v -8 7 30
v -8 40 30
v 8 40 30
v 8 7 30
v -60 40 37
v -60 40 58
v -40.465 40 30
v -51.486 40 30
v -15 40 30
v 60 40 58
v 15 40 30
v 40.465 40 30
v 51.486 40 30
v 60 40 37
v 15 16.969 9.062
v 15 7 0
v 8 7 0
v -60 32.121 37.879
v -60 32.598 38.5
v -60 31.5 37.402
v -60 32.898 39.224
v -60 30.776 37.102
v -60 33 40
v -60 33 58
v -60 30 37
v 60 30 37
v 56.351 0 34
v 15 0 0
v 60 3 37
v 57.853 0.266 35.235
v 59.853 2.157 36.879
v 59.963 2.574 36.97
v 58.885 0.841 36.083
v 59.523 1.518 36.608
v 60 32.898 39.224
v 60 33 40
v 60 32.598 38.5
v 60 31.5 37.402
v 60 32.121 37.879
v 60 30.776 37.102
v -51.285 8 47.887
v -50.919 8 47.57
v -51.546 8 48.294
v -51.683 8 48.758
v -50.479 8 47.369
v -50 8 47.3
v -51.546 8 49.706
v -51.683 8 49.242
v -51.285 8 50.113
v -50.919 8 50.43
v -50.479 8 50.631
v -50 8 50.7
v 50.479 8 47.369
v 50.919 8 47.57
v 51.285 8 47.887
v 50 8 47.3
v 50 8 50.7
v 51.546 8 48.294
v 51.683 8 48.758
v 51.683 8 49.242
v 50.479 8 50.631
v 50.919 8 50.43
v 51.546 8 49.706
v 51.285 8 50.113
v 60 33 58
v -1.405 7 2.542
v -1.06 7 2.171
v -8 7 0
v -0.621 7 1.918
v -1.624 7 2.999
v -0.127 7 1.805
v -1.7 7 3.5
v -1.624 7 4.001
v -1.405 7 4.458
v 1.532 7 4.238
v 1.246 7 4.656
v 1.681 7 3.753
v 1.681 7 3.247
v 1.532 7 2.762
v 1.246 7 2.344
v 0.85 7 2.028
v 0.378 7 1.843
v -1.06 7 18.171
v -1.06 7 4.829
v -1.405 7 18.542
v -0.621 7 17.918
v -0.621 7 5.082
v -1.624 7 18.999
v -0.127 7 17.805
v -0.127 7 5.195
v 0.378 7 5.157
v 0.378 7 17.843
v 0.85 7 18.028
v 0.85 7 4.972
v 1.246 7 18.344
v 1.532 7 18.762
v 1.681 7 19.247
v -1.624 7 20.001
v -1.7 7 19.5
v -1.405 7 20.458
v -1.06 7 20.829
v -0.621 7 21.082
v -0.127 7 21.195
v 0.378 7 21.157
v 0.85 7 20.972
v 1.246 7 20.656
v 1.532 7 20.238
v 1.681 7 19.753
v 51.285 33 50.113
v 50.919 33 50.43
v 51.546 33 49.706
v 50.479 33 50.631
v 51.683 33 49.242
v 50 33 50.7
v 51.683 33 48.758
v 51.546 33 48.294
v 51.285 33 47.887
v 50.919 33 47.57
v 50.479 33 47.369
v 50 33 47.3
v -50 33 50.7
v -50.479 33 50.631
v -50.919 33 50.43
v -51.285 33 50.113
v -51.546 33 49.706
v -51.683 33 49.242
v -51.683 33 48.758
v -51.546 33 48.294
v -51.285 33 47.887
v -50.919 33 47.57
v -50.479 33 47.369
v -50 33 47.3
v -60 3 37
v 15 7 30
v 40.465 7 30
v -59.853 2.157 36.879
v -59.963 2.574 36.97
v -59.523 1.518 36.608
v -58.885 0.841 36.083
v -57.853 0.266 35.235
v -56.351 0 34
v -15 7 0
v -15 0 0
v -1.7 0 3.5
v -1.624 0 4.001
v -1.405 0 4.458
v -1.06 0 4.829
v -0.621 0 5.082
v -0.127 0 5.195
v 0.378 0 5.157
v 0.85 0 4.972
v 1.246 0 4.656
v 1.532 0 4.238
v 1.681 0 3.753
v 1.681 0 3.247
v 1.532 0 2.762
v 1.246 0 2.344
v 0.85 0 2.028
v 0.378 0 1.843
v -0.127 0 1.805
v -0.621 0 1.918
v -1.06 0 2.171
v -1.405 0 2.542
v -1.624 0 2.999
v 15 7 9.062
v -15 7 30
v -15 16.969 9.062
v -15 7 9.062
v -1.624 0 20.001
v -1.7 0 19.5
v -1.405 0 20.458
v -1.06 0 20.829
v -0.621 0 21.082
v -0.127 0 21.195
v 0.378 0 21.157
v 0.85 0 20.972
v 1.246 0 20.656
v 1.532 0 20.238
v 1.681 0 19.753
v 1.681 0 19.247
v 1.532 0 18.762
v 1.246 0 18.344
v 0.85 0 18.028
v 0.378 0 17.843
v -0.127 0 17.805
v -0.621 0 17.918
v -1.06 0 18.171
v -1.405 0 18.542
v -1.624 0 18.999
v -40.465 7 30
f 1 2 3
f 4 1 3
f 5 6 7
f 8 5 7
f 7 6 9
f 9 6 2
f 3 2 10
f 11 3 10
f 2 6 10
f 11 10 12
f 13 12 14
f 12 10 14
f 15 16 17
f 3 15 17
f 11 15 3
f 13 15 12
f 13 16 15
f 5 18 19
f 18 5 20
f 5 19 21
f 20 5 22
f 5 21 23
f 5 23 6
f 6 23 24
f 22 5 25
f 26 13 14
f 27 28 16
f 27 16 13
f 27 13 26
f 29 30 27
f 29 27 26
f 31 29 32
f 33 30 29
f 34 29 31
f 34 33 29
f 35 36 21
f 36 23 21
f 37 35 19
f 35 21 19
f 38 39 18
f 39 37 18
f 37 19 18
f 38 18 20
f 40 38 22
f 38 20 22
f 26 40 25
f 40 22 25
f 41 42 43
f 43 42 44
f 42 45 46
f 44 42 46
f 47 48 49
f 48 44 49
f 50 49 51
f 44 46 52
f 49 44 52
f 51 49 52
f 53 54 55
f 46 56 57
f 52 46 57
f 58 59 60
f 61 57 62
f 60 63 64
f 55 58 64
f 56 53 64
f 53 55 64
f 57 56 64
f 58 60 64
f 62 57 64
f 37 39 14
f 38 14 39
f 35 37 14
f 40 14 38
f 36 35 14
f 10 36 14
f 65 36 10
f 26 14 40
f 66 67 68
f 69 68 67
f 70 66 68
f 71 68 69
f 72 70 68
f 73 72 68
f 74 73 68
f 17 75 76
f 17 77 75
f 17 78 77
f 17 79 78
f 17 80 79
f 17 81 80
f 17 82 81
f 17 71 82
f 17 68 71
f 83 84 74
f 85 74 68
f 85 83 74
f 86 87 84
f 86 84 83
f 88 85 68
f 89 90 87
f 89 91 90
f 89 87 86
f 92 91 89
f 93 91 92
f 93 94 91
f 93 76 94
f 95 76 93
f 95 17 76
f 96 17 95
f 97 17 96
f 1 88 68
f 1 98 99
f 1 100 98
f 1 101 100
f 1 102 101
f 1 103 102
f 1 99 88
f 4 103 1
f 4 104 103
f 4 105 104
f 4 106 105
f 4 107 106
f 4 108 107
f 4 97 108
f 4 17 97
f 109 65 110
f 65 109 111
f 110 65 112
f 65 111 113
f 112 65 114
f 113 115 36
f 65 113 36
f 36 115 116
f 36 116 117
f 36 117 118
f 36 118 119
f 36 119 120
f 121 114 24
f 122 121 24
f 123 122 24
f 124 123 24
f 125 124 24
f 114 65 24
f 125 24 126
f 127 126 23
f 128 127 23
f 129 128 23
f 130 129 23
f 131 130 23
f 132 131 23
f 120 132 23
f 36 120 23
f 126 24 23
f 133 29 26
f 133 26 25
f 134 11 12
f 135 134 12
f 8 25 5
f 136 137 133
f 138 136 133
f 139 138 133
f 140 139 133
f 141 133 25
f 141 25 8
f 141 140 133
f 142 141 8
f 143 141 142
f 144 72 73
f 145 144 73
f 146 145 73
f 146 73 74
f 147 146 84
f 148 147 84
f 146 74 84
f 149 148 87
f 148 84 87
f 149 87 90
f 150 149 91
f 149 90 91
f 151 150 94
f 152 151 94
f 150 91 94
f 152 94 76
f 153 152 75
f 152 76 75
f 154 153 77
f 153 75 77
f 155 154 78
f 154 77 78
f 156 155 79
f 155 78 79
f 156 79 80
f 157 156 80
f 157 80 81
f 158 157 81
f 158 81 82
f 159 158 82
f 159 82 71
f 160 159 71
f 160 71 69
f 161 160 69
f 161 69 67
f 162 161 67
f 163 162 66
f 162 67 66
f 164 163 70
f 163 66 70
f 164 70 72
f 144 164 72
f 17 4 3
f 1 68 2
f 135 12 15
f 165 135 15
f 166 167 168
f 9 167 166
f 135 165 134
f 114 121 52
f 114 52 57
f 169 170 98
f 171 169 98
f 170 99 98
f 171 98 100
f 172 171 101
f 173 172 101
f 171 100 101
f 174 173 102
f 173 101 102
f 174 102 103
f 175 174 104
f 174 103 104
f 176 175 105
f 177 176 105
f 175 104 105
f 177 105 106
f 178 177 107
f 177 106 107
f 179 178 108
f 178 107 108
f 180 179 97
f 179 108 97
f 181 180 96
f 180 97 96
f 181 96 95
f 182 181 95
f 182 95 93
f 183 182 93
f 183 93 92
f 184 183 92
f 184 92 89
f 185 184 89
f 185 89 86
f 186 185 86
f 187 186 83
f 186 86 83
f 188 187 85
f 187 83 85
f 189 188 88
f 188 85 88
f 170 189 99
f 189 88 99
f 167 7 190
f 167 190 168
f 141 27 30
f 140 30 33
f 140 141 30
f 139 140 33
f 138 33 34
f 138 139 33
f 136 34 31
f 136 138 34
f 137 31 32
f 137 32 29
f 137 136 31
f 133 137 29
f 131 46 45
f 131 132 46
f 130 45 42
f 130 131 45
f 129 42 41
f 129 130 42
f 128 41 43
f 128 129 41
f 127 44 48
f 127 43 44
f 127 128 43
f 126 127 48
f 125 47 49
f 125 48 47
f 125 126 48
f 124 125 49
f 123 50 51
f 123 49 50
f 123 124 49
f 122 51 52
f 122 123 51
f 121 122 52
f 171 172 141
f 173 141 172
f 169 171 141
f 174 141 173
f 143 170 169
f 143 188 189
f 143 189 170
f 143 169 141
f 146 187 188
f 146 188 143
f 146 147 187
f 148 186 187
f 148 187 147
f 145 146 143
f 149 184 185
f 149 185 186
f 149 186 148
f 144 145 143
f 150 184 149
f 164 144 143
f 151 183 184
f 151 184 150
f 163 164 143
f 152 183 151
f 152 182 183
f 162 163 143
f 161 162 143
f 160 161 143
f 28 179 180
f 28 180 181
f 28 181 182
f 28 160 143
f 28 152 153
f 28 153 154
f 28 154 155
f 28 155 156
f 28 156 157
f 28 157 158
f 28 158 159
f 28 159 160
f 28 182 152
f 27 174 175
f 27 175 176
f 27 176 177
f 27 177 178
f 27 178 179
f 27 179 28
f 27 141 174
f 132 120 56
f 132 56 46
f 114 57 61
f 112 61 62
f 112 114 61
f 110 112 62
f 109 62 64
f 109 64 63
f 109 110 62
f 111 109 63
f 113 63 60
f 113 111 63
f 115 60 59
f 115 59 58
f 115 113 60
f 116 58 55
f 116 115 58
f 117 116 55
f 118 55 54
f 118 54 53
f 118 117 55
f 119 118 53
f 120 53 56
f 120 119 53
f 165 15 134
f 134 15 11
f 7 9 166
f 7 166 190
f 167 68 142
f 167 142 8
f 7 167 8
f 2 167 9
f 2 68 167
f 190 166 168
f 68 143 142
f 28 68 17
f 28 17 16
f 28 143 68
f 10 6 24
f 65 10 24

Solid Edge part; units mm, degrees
sketch "Sketch1" plane through (0, 0, 0) normal (0, -1, 0) x (1, 0, 0)
  line L0 (-60, 37) -> (-15, 0)
  line L1 (-15, 0) -> (15, 0)
  line L2 (15, 0) -> (60, 37)
  line L3 (60, 37) -> (-60, 37)
  dimension "D1" = 30
  dimension "D2" = 120
  dimension "D3" = 37
extrude "Protrusion1" add sketch "Sketch1" against normal blind 40
sketch "Sketch2" plane through (0, 40, 18.5) normal (0, 1, 0) x (-1, 0, 0)
  line L0 (-8, -18.5) -> (8, -18.5)
  line L1 (8, -18.5) -> (8, 11.5)
  line L2 (8, 11.5) -> (-8, 11.5)
  line L3 (-8, 11.5) -> (-8, -18.5)
  line L4 (-40.4647, 11.5) -> (-15, -9.4376)
  line L5 (-15, -9.4376) -> (-15, 11.5)
  line L6 (-15, 11.5) -> (-40.4647, 11.5)
  line L7 (40.4647, 11.5) -> (15, -9.4376)
  line L8 (15, -9.4376) -> (15, 11.5)
  line L9 (15, 11.5) -> (40.4647, 11.5)
  dimension "D1" = 16
  dimension "D2" = 10.5
  dimension "D3" = 16
  dimension "D4" = 7
  dimension "D5" = 7
  dimension "D6" = 7
extrude "ExtrudedCutout_1" cut sketch "Sketch2" against normal blind 33
sketch "Sketch3" plane through (0, 7, 15) normal (0, 1, 0) x (-1, 0, 0)
  circle A0 centre (0, -11.5) radius 1.7
  circle A1 centre (0, 4.5) radius 1.7
  dimension "D1" = 1.7
  dimension "D2" = 100
  dimension "D3" = 12
extrude "Cutout1" cut sketch "Sketch3" against normal through all
sketch "Sketch4" plane through (0, 0, 0) normal (1, 0, 0) x (0, 1, 0)
  line L0 (7, 0) -> (40, 30)
extrude "Cutout2" cut sketch "Sketch4" against normal through all and the other way through all material side at (0, 23.5336, 14.963)
sketch "Sketch5" plane through (0, 0, 0) normal (1, 0, 0) x (0, 1, 0)
  line L0 (40, 37) -> (40, 58)
  line L1 (40, 58) -> (33, 58)
  line L2 (33, 58) -> (33, 40)
  arc A0 (30, 37) -> (33, 40) centre (30, 40) ccw
  line L3 (40, 37) -> (30, 37)
  dimension "D1" = 7
  dimension "D2" = 3
  dimension "D3" = 21
extrude "ExtrudedProtrusion_3" add sketch "Sketch5" along normal mid plane 120
fillet "Round_1" radius 3 1 edges at (0, 0, 37)
extrude "Cutout3" [suppressed]
sketch "Sketch6" plane through (0, 33, 49) normal (0, -1, 0) x (1, 0, 0)
  line L0 (-50, 1.7) -> (50, 1.7)
  arc A0 (50, 1.7) -> (50, -1.7) centre (50, 0) cw
  line L1 (50, -1.7) -> (-50, -1.7)
  arc A1 (-50, 1.7) -> (-50, -1.7) centre (-50, 0) ccw
  dimension "D1" = 1.7
  dimension "D2" = 100
  dimension "D3" = 12
extrude "ExtrudedProtrusion_4" add sketch "Sketch6" along normal blind 25
properties material "ABS Plastic, medium impact"
